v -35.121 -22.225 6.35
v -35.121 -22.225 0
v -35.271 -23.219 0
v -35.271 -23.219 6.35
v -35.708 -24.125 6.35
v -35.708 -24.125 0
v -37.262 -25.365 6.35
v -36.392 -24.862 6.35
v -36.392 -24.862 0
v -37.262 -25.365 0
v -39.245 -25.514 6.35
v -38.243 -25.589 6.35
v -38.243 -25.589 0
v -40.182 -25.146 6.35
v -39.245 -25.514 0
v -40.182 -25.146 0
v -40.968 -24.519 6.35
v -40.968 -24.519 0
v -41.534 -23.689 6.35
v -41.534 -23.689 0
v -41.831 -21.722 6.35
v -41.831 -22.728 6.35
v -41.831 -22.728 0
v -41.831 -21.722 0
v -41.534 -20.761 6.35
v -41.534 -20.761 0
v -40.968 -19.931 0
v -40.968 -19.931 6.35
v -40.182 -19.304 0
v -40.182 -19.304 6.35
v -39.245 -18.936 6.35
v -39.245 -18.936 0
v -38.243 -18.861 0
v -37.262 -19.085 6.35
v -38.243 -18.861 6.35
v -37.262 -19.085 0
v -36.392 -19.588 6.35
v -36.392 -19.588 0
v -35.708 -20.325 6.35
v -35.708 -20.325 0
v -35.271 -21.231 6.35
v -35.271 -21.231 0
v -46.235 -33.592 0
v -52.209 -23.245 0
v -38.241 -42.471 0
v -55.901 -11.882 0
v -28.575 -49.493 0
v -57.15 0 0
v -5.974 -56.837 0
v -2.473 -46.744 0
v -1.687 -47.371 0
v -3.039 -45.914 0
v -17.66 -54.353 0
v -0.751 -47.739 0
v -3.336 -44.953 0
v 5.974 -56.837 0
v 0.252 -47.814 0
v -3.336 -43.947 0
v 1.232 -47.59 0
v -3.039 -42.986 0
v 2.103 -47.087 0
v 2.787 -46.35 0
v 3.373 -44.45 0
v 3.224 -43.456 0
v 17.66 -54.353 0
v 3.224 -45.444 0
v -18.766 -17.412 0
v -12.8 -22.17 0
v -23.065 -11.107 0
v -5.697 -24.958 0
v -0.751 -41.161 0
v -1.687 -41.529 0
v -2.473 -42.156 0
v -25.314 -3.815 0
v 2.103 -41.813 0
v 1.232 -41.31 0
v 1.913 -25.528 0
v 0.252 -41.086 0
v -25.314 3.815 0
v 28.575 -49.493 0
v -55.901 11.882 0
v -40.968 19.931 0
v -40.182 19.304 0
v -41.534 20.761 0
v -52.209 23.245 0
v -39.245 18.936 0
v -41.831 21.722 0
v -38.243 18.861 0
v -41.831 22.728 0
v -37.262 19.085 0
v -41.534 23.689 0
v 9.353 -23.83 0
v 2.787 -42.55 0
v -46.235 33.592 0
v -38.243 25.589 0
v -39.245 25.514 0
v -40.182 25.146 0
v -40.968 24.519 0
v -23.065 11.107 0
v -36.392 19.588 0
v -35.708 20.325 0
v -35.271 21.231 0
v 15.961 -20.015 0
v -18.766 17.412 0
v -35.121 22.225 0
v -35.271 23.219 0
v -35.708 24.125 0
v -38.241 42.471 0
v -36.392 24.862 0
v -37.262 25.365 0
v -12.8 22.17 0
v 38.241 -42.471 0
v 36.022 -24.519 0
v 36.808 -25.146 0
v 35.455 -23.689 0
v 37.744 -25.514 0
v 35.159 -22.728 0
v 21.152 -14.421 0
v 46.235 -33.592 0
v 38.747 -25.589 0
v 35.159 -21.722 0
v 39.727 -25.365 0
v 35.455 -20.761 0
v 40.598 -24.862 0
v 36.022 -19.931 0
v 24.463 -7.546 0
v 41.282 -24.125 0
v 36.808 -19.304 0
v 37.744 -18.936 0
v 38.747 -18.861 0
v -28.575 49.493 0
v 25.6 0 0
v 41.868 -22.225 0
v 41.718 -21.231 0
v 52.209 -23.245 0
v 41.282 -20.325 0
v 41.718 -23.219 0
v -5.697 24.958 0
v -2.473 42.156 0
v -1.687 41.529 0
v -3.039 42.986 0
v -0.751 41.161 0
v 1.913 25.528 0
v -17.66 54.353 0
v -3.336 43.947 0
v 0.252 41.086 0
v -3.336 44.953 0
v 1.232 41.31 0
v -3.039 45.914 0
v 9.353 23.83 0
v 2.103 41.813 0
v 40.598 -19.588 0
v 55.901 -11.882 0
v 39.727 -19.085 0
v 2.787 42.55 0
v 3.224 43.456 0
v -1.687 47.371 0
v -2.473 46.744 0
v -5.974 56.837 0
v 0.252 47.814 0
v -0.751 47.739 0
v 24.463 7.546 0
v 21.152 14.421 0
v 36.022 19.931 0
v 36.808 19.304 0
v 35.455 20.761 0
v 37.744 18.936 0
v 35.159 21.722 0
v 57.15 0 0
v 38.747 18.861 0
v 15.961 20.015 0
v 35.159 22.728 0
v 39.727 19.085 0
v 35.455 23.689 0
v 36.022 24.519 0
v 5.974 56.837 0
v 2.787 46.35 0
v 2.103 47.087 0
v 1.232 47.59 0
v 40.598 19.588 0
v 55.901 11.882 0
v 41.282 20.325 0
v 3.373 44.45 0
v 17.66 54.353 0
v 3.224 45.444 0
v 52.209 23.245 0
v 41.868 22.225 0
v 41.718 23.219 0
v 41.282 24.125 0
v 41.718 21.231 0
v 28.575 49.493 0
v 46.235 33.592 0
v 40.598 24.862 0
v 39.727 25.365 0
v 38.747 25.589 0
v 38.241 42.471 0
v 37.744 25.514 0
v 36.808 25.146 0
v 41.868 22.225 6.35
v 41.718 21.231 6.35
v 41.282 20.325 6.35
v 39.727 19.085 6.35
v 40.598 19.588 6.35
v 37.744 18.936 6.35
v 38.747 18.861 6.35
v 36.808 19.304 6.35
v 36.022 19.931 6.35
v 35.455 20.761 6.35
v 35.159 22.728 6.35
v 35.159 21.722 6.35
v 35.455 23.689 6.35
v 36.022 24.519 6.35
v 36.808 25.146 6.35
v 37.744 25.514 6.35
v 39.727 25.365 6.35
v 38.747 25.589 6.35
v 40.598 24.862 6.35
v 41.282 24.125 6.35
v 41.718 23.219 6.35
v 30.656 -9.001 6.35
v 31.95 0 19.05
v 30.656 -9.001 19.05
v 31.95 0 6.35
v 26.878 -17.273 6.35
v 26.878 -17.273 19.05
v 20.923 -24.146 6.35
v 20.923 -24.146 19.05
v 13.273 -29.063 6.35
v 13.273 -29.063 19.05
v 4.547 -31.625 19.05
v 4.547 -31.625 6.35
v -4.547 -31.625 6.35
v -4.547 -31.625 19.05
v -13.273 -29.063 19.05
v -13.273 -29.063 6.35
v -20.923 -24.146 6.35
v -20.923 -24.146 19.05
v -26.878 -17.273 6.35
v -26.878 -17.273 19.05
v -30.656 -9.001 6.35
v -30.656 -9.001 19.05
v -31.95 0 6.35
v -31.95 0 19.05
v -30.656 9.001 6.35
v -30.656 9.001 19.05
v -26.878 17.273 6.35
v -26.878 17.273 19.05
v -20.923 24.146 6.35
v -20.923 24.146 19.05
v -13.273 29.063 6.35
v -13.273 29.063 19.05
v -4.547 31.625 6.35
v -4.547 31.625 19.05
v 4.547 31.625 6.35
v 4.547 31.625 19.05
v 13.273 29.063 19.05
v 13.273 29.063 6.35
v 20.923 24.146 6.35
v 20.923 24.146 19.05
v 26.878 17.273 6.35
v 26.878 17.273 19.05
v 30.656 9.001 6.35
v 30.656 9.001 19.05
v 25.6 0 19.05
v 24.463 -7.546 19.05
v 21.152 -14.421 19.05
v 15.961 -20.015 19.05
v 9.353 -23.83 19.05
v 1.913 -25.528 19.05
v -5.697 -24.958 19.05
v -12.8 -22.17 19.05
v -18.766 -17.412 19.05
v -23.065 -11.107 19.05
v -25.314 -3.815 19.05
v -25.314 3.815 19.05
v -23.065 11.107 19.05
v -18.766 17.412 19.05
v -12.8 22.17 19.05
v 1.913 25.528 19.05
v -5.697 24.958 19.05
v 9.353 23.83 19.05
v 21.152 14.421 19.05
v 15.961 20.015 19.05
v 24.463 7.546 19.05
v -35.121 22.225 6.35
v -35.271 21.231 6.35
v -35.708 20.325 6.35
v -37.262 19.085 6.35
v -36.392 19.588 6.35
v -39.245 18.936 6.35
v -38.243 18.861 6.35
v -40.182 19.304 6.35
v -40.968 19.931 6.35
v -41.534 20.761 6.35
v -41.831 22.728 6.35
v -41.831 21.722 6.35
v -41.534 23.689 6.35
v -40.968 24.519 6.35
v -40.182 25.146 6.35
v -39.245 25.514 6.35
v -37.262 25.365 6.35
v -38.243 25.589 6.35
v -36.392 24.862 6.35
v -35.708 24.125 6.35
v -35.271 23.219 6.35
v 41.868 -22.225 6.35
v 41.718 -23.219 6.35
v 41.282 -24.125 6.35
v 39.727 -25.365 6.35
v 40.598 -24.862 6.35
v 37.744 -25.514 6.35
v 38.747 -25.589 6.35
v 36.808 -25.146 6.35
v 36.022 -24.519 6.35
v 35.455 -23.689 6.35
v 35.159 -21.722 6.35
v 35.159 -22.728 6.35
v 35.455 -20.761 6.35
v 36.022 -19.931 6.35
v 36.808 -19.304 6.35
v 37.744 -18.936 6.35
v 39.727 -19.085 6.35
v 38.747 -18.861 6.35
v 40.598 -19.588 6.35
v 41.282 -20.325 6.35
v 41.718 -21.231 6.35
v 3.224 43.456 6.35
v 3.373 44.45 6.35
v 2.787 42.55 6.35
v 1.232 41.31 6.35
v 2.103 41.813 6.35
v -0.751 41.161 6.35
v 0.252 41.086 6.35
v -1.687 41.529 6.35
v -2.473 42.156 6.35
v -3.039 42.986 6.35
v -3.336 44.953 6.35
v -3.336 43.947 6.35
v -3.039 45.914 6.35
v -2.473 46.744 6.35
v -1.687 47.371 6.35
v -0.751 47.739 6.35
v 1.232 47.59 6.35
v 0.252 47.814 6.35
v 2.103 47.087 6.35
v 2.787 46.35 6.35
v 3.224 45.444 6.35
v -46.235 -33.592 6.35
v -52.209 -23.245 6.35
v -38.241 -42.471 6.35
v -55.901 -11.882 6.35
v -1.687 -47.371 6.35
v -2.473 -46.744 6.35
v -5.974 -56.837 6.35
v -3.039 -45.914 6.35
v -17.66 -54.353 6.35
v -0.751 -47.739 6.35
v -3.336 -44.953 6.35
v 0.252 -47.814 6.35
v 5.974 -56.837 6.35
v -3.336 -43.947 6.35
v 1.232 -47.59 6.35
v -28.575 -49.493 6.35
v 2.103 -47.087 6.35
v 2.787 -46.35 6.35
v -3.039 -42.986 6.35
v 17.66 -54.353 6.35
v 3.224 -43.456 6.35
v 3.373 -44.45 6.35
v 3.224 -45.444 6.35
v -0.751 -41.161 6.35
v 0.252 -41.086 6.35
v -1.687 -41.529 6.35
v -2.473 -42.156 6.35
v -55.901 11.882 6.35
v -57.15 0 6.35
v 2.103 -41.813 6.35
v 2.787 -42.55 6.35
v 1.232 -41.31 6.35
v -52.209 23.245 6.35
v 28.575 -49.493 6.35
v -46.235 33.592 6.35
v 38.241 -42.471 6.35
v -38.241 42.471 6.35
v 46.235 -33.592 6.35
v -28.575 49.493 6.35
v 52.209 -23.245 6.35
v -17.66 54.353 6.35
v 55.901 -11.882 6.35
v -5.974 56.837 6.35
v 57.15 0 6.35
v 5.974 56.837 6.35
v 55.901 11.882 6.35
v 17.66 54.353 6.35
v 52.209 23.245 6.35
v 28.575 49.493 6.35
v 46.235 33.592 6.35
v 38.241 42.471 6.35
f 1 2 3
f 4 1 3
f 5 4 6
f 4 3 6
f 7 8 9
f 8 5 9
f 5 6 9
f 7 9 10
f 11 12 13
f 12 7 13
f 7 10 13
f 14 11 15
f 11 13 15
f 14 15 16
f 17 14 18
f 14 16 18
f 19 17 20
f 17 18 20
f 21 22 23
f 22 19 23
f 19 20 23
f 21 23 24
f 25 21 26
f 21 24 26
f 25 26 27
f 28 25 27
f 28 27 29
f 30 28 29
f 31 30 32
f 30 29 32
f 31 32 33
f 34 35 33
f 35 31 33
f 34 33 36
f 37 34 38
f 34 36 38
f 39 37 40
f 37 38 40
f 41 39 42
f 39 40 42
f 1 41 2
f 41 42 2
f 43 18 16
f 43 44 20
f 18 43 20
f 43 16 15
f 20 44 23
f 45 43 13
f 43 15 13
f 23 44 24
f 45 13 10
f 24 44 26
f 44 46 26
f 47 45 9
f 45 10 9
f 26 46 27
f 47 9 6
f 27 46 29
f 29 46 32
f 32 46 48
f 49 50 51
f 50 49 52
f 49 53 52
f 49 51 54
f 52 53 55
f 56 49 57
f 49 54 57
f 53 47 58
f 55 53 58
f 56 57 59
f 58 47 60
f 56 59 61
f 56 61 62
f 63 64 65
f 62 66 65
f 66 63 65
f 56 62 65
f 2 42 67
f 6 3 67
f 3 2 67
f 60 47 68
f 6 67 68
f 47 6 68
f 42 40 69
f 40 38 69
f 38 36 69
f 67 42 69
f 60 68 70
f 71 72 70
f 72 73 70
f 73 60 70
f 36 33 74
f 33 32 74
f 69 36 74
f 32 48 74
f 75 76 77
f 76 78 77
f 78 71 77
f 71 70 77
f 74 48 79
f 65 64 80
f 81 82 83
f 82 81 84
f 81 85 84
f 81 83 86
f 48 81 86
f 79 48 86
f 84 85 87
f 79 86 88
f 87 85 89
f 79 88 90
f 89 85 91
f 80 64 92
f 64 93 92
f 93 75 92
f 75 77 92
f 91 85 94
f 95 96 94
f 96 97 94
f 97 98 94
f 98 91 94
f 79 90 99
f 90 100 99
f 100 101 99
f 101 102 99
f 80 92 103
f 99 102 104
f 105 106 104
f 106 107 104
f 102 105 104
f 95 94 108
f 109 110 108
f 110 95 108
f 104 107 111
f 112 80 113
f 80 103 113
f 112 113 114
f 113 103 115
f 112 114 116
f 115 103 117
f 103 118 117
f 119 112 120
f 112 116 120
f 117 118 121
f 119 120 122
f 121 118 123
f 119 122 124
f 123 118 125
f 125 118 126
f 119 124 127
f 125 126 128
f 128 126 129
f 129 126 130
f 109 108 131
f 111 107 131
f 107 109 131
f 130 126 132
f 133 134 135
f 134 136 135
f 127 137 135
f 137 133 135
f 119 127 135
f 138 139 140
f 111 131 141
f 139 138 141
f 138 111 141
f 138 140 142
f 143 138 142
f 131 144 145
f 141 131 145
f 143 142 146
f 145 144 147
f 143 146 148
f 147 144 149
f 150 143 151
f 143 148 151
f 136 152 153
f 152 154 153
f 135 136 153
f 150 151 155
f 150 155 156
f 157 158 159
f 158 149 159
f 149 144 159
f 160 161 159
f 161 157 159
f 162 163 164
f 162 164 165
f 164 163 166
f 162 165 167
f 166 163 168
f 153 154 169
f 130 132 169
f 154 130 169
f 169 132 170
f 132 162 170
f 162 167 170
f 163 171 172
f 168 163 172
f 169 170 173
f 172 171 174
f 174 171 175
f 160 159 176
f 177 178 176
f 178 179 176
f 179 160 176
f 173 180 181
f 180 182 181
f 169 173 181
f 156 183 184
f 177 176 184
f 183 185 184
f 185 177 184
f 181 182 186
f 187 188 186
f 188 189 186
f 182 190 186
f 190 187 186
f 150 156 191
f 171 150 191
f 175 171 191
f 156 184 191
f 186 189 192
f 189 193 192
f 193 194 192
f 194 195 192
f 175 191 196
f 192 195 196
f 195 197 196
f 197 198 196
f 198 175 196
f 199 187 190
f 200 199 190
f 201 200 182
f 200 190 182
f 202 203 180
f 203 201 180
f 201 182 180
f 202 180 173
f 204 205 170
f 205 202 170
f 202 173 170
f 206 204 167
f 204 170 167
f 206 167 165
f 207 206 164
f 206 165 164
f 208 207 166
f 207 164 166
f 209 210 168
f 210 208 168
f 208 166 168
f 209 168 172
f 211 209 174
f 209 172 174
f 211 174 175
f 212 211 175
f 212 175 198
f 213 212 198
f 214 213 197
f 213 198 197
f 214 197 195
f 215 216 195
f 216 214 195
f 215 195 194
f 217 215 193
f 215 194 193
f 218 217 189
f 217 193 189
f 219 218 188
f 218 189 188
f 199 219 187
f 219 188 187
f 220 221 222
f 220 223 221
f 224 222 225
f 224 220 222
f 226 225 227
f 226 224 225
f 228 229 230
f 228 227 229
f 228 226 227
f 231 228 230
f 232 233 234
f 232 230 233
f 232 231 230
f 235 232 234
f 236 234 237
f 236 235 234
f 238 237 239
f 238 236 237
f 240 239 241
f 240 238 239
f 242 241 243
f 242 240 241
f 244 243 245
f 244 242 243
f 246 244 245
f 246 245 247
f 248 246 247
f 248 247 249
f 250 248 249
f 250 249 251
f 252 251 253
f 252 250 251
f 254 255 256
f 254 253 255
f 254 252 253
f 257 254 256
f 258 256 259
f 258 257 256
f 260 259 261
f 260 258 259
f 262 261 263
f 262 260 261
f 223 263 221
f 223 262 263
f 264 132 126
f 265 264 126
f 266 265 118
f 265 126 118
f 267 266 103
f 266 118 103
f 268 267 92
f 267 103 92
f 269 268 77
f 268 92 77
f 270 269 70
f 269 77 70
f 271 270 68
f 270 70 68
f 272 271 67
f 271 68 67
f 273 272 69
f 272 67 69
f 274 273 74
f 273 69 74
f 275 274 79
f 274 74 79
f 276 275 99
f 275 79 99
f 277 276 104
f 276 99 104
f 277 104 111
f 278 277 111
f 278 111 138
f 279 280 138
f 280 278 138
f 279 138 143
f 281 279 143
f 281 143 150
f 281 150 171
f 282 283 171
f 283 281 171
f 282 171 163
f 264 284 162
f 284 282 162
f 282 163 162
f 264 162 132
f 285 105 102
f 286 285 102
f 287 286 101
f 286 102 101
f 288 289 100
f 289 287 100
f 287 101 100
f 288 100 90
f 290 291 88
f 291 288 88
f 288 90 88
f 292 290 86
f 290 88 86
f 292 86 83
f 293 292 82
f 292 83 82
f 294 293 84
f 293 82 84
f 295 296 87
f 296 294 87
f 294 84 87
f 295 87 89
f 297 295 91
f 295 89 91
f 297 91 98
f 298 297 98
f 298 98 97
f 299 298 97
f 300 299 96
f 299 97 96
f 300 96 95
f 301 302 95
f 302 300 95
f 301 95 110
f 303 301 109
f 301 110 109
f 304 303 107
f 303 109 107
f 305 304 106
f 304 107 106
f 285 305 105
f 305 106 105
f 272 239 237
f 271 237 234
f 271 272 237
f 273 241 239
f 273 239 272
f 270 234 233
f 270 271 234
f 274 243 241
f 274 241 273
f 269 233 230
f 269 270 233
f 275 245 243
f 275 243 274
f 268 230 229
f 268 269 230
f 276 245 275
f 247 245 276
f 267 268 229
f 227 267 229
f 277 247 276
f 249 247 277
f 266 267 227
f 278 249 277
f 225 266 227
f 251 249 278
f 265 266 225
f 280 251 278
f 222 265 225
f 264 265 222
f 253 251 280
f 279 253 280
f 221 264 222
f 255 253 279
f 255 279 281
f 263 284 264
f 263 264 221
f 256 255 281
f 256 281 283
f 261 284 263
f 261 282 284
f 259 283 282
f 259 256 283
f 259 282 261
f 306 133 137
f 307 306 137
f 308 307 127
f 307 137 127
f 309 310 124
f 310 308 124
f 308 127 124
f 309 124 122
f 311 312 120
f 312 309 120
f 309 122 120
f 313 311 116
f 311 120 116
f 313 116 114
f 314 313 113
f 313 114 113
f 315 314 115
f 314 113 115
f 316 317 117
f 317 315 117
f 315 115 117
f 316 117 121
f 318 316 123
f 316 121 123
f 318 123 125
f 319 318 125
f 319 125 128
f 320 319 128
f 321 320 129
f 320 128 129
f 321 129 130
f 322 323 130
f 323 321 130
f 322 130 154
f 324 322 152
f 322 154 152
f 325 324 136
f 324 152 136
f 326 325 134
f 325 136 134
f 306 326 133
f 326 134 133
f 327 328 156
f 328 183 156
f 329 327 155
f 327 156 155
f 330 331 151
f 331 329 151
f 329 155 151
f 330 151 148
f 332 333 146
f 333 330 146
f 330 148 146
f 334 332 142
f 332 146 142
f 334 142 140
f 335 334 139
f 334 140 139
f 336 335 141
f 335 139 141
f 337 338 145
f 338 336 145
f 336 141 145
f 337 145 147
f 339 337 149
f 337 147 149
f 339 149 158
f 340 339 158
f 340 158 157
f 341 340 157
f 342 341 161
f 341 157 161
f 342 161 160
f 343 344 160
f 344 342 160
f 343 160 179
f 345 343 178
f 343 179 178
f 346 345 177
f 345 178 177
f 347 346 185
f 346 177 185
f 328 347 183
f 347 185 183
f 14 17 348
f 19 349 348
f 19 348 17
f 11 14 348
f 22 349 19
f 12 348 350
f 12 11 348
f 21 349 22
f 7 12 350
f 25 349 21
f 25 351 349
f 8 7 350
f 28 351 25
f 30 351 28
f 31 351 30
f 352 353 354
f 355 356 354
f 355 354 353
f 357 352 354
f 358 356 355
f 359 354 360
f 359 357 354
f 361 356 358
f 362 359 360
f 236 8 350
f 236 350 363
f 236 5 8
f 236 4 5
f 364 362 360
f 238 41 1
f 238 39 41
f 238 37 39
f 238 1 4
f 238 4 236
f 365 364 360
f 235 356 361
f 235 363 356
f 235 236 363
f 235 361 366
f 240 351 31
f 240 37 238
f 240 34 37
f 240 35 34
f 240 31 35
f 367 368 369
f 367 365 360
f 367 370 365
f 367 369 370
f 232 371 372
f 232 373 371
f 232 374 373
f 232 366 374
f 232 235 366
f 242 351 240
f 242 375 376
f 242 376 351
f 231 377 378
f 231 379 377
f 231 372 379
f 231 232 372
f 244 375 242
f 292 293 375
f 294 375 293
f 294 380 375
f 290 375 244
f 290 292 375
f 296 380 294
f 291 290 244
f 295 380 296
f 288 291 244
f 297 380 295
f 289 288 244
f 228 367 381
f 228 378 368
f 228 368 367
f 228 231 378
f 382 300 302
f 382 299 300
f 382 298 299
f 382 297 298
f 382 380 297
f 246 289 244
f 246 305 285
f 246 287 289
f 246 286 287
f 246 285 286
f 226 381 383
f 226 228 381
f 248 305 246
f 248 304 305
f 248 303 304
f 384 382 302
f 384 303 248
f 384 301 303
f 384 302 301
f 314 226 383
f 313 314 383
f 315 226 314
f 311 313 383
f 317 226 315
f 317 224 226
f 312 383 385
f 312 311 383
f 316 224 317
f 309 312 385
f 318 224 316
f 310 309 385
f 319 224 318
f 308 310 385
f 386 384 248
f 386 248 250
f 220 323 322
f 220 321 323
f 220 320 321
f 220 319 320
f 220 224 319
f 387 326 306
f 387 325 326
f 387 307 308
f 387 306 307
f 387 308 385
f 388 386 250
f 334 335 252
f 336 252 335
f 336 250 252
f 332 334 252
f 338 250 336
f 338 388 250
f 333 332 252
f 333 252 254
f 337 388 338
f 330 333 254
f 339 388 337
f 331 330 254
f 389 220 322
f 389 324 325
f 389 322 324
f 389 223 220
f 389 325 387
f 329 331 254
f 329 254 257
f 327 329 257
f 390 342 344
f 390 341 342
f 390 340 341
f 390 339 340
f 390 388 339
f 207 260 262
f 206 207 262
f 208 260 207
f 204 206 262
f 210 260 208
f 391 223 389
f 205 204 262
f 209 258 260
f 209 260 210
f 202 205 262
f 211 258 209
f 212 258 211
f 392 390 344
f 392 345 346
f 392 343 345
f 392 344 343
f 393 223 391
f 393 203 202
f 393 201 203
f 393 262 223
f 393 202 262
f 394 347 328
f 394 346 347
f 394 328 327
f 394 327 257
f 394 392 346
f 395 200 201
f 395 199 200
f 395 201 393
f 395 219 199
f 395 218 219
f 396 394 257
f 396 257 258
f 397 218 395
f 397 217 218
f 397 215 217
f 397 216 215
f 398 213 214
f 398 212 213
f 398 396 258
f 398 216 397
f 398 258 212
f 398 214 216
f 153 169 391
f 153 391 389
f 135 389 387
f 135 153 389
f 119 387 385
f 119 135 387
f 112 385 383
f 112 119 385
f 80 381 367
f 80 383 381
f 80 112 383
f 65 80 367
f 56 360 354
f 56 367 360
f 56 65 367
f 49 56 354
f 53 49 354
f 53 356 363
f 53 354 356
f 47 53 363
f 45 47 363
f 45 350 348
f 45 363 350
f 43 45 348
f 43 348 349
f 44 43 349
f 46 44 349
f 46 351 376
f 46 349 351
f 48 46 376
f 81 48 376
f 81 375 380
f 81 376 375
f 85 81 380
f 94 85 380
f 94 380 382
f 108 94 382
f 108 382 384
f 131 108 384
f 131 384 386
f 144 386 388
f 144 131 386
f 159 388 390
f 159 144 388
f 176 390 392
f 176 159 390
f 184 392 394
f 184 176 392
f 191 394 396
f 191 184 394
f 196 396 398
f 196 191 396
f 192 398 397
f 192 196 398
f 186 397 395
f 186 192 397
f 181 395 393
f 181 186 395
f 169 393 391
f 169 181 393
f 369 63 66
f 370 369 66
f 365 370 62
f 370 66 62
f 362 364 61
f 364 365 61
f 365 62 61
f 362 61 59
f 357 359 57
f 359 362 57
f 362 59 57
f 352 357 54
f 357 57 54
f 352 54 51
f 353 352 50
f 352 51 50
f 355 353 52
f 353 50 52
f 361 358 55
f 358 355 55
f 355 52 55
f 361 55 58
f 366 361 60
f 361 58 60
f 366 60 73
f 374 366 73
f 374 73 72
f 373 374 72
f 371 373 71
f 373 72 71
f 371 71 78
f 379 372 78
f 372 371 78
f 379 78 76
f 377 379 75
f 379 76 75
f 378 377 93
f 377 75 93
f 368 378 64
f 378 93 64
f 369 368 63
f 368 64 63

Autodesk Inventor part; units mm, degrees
ref_plane "YZ Plane" through (0, 0, 0) normal (1, 0, 0) x (0, 1, 0)
ref_plane "XZ Plane" through (0, 0, 0) normal (0, 1, 0) x (-1, 0, 0)
ref_plane "XY Plane" through (0, 0, 0) normal (0, 0, 1) x (1, 0, 0)
sketch "Sketch1" plane through (0, 0, 0) normal (0, 0, 1) x (1, 0, 0)
  circle A0 centre (0, 0) radius 25.6
  circle A1 centre (0, 0) radius 57.15
  circle A2 centre (0, 44.45) radius 3.3734
  circle A3 centre (-38.4948, 22.225) radius 3.3734
  circle A4 centre (-38.4948, -22.225) radius 3.3734
  circle A5 centre (0, -44.45) radius 3.3734
  circle A6 centre (38.4948, -22.225) radius 3.3734
  circle A7 centre (38.4948, 22.225) radius 3.3734
  dimension "d0" = 51.2
  dimension "d1" = 44.45
  dimension "d2" = 6.7469
  dimension "d3" = 114.3
  dimension "d6" = 360
extrude "Extrusion1" add sketch "Sketch1" along normal blind 6.35
sketch "Sketch2" plane through (0, 0, 6.35) normal (0, 0, 1) x (1, 0, 0)
  circle A0 centre (0, 0) radius 31.95
  circle A1 centre (0, 0) radius 25.6 projected
  dimension "d10" = 6.35
extrude "Extrusion2" add sketch "Sketch2" along normal blind 12.7
properties part number "IndexerWheelBushing"
